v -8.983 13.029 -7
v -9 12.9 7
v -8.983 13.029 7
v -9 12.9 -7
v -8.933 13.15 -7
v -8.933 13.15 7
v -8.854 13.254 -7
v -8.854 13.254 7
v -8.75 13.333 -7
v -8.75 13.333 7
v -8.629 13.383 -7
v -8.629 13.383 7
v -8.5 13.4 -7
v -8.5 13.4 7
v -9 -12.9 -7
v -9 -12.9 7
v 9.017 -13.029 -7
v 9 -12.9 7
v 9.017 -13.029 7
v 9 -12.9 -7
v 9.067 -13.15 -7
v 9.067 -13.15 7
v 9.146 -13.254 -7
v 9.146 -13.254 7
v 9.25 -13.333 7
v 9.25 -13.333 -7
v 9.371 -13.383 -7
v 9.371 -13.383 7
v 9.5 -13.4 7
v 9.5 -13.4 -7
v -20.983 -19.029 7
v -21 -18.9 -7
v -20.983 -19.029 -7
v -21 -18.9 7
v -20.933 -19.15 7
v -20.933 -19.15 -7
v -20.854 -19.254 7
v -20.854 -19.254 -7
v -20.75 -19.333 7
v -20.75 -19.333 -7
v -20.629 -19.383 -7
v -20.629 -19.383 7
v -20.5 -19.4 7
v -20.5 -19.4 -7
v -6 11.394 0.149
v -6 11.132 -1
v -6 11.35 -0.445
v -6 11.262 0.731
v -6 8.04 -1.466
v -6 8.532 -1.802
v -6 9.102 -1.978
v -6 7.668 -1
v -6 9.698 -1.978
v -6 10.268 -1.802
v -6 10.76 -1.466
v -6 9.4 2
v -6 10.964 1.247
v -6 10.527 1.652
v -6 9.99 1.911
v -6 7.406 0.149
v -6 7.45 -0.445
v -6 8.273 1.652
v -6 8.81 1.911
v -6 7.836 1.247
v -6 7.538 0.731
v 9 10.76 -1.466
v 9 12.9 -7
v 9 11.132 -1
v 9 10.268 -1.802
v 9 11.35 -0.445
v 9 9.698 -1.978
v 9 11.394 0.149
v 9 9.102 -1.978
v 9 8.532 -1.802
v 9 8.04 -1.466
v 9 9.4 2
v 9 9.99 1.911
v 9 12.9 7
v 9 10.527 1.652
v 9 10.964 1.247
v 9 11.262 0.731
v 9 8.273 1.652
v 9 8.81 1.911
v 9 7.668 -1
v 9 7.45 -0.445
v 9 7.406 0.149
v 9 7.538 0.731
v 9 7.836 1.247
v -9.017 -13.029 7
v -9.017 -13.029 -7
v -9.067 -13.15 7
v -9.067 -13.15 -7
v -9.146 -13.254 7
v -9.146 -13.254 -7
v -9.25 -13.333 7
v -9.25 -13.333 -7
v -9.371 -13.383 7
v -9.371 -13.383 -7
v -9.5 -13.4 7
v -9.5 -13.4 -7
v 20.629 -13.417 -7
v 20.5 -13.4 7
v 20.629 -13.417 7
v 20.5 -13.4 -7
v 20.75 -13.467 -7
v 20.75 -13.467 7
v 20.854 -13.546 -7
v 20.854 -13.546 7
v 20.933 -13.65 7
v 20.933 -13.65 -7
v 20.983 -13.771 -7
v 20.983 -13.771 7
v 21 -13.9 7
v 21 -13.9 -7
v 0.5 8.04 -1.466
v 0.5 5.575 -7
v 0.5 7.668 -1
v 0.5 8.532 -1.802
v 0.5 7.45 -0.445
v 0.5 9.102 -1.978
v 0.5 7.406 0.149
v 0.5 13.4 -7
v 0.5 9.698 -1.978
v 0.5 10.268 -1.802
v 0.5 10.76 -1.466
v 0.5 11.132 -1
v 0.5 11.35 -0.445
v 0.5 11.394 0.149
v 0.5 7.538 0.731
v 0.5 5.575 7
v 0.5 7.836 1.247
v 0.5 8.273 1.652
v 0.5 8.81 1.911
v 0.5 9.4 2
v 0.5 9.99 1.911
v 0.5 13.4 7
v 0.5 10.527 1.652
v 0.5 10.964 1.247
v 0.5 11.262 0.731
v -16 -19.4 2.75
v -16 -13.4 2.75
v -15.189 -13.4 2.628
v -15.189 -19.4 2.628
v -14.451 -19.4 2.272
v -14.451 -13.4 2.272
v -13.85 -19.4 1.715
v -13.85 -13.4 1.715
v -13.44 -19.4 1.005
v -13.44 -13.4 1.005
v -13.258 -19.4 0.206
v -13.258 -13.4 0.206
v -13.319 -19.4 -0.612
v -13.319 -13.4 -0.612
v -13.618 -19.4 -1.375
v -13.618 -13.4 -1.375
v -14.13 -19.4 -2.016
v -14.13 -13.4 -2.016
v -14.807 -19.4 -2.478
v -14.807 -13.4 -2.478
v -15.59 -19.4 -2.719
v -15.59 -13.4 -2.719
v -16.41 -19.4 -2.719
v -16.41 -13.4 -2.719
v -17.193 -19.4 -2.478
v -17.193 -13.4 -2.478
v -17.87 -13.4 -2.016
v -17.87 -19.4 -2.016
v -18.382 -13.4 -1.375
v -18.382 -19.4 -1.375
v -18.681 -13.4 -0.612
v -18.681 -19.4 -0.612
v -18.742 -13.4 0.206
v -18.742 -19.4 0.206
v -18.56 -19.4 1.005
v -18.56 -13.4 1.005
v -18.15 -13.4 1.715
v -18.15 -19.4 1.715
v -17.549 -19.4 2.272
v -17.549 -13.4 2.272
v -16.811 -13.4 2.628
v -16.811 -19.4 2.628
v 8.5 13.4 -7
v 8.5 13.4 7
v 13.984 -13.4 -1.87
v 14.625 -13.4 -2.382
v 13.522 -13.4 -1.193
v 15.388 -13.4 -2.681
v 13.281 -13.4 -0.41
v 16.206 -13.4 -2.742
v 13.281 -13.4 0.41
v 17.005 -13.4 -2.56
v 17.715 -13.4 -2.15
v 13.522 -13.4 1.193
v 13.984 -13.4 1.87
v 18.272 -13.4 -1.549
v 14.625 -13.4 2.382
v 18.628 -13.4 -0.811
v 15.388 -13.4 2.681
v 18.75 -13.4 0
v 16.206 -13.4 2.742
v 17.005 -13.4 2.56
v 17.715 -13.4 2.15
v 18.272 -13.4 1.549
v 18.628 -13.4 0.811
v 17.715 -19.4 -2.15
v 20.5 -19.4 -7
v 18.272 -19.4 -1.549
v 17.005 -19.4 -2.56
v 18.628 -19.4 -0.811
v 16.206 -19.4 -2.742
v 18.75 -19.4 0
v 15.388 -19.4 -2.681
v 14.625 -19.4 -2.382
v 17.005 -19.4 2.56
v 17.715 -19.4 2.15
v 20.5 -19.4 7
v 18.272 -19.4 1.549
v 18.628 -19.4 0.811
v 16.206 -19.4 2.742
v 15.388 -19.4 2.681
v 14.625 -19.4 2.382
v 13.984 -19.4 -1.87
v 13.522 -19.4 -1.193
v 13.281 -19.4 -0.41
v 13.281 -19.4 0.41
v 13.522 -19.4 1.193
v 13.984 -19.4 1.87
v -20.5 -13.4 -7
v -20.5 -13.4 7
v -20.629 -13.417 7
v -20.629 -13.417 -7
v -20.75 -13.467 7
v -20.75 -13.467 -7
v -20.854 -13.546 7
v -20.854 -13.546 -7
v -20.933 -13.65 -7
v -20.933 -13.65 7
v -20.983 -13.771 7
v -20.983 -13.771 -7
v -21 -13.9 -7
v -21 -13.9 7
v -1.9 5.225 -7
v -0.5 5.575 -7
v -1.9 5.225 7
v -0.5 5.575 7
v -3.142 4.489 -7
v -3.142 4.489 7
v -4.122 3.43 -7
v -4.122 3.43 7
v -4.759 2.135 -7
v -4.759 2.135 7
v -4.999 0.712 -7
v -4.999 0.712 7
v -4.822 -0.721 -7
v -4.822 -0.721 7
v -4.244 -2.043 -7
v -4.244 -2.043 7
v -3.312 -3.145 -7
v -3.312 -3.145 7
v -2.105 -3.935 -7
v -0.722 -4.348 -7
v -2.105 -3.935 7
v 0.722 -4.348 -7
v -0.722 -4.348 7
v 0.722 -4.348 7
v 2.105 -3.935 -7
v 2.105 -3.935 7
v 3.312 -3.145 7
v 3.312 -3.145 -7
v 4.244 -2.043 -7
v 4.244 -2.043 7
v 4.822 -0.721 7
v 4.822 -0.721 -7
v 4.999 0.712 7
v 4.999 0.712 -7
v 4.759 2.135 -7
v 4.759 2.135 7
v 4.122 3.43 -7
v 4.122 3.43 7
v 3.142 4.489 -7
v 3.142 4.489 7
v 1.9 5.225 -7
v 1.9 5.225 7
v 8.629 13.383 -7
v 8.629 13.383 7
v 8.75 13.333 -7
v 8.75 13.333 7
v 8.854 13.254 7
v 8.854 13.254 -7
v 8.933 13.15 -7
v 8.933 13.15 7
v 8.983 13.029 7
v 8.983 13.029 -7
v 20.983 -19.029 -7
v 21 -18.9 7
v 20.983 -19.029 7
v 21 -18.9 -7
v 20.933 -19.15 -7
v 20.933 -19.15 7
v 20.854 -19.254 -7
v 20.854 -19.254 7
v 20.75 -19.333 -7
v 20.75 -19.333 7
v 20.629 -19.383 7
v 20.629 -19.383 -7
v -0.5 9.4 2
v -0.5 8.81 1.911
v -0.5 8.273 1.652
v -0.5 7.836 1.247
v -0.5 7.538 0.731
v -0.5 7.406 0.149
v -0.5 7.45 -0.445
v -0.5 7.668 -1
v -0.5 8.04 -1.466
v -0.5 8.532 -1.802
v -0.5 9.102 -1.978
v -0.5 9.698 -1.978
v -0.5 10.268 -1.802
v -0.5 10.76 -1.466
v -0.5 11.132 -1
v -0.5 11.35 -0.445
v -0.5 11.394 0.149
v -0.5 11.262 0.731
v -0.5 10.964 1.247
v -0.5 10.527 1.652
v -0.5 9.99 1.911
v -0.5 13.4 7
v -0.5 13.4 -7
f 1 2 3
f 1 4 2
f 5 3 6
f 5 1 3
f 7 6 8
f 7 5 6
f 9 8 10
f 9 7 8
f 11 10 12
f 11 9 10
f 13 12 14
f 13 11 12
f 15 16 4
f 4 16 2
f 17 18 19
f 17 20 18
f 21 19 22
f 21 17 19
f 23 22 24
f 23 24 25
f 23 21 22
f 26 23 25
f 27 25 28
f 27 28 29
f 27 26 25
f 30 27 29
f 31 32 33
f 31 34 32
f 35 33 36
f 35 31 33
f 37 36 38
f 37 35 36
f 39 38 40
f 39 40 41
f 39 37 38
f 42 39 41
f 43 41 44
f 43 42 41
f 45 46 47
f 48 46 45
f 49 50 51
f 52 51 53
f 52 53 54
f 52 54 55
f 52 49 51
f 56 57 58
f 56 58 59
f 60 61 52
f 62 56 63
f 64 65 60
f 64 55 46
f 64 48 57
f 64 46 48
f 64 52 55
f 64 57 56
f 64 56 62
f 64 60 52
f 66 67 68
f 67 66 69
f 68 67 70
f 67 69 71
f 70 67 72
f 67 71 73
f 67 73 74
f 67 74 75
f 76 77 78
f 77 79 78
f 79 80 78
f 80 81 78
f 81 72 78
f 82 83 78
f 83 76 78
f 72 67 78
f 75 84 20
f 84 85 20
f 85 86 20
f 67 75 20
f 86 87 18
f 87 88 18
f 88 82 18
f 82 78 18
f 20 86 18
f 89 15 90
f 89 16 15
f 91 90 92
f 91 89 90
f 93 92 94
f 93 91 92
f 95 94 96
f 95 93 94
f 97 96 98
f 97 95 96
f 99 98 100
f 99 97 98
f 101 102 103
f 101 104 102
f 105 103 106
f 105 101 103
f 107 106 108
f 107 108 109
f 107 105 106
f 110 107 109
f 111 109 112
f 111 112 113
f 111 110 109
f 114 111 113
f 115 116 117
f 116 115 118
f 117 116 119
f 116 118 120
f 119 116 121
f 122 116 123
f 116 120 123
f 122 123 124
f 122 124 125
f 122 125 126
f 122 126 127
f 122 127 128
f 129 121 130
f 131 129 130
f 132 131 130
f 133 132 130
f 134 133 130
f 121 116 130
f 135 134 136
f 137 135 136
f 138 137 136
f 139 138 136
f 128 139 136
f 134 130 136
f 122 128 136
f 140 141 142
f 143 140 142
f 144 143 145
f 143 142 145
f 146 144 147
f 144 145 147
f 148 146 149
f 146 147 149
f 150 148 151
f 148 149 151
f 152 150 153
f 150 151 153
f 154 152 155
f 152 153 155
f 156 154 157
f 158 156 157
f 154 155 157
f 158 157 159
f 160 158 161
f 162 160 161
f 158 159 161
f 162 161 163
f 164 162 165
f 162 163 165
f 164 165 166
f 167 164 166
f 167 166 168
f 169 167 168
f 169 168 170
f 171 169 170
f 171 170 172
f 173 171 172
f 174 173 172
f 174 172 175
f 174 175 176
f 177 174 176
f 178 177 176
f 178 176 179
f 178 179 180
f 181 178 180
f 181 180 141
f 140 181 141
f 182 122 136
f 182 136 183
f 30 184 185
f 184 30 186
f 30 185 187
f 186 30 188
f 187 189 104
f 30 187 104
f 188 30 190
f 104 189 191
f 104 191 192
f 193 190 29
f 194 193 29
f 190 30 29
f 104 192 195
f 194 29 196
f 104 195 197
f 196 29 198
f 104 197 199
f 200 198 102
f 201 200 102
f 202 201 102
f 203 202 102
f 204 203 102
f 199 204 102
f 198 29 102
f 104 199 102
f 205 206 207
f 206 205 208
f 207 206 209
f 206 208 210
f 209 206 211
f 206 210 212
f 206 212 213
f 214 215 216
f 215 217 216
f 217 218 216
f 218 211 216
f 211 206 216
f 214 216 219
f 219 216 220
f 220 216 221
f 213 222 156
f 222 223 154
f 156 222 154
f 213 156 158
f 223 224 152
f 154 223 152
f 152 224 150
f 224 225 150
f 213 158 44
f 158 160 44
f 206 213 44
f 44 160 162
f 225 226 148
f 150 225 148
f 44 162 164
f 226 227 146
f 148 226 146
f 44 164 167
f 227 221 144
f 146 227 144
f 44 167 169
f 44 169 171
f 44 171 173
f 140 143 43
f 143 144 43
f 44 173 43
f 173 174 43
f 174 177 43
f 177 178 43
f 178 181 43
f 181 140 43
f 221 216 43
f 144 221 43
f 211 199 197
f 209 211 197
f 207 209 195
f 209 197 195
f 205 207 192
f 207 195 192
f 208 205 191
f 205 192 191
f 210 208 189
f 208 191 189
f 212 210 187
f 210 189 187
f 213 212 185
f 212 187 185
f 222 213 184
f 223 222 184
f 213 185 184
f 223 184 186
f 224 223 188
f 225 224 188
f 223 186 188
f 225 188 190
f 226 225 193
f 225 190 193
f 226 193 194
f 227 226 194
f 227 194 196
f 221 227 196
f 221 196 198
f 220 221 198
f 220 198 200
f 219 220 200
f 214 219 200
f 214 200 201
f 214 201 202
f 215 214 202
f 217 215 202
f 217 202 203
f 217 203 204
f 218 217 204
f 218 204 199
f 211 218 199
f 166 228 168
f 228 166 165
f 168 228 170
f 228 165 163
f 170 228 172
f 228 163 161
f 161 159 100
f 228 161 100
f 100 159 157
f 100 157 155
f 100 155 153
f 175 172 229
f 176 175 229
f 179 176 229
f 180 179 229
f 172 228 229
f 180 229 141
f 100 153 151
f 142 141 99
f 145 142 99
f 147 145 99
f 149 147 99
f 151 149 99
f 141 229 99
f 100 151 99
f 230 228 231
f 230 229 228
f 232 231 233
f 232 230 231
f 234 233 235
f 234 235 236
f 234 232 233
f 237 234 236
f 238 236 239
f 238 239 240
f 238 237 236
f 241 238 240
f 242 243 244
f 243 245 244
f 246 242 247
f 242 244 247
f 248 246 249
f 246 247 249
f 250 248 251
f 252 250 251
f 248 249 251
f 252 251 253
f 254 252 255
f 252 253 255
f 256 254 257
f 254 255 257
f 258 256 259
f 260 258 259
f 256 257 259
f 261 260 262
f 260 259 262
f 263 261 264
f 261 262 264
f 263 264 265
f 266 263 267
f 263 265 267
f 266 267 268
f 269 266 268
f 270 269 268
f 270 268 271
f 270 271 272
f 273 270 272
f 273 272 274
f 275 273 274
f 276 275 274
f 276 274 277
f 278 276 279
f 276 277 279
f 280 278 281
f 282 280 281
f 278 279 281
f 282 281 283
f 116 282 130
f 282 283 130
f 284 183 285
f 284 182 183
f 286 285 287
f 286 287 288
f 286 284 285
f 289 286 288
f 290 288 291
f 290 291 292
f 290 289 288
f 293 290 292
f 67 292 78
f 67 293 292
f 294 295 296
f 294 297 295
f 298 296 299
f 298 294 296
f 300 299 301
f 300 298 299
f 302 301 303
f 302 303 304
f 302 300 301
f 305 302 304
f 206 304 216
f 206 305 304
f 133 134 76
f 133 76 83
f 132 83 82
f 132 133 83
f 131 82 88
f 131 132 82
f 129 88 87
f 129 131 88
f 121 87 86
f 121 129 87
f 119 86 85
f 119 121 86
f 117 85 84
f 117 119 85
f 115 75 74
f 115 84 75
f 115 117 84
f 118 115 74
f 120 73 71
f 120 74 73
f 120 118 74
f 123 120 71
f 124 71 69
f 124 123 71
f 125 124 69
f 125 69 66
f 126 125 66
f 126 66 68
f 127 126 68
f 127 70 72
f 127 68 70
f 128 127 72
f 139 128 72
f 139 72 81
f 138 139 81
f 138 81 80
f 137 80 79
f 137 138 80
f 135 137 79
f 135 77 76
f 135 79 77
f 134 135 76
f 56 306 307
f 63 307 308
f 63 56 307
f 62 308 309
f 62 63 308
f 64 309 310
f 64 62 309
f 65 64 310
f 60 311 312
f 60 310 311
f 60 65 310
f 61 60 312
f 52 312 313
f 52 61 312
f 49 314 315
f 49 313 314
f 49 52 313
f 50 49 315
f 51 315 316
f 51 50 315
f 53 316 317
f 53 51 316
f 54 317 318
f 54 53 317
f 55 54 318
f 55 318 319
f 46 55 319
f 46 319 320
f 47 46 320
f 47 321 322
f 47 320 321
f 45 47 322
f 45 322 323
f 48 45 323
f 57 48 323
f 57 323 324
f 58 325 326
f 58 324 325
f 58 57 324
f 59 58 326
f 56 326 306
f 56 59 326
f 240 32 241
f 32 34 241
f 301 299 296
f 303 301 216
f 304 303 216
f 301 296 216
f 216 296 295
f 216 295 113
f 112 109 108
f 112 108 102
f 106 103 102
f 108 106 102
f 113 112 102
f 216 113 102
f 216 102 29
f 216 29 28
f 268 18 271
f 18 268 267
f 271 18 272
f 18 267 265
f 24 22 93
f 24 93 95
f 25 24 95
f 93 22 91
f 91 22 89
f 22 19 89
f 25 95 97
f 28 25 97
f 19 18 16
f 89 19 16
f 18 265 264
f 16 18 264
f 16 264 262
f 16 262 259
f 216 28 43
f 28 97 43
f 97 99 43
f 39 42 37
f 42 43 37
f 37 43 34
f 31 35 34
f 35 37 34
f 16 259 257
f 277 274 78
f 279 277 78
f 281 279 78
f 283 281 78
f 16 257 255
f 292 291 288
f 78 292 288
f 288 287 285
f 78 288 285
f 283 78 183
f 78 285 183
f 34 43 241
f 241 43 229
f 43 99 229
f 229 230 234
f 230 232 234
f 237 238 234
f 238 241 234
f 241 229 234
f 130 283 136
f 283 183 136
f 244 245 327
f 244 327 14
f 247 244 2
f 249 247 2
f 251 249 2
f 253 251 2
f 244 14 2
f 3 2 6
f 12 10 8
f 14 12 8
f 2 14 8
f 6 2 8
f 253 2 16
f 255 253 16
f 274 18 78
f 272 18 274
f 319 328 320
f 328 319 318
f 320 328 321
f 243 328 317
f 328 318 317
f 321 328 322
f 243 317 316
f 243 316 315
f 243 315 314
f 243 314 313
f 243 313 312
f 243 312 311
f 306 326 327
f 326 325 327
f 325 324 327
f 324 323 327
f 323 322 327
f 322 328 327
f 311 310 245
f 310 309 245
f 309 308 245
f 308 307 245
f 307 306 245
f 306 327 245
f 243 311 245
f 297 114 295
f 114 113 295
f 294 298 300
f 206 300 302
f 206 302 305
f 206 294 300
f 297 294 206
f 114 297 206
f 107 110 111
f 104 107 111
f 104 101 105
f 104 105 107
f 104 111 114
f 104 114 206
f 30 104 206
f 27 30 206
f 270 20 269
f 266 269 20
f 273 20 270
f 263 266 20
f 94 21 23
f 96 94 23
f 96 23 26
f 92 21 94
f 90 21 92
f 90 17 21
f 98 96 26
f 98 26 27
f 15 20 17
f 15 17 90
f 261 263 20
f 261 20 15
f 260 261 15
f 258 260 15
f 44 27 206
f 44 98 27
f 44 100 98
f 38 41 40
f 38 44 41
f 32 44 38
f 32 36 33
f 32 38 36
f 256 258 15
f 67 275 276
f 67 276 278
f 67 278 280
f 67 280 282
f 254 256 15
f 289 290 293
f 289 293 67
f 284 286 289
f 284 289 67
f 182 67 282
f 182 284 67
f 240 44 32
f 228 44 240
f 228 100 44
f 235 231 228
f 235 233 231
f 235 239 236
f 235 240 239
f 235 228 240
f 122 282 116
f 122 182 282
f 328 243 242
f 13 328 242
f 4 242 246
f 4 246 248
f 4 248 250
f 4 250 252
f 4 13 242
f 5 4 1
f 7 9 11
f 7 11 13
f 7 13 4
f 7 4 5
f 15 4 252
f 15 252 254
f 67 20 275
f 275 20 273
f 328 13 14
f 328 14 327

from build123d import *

# Parameters (mm, degrees)
BOSS_EXTRUDE1_DEPTH     = 7
SKETCH2_R               = 2.75
CUT_EXTRUDE1_DEPTH      = 30.433993953
CUT_EXTRUDE2_DEPTH      = 30.433993953
CUT_EXTRUDE2_DEPTH_BACK = 6
SKETCH3_R               = 2
FILLET1_R               = 0.5


with BuildPart() as part:
    # Sketch1 → Boss-Extrude1 (new, symmetric)
    with BuildSketch(Plane.XY):
        with BuildLine():
            Line((-9, -13.4), (-9, 13.4))
            Line((-9, 13.4), (-0.5, 13.4))
            Line((-0.5, 13.4), (-0.5, 5.574937186))
            ThreePointArc((-0.5, 5.574937186), (0, -4.4), (0.5, 5.574937186))
            Line((0.5, 5.574937186), (0.5, 13.4))
            Line((0.5, 13.4), (9, 13.4))
            Line((9, 13.4), (9, -13.4))
            Line((9, -13.4), (21, -13.4))
            Line((21, -13.4), (21, -19.4))
            Line((21, -19.4), (-21, -19.4))
            Line((-21, -19.4), (-21, -13.4))
            Line((-21, -13.4), (-9, -13.4))
        make_face()
    extrude(amount=BOSS_EXTRUDE1_DEPTH, both=True)

    # Sketch2 → Cut-Extrude1 (cut, through all)
    with BuildSketch(Plane(origin=(0, 0, 0), x_dir=(1, 0, 0), z_dir=(0, 1, 0))):
        with Locations(Location((-16, 0, 0), (0, 0, 270))):
            Circle(SKETCH2_R)
        with Locations((16, 0)):
            Circle(SKETCH2_R)
    extrude(amount=-CUT_EXTRUDE1_DEPTH, mode=Mode.SUBTRACT)

    # Sketch3 → Cut-Extrude2 (cut, two sides: drawn at the far end of the back side and taken through both)
    with BuildSketch(Plane(origin=(0, 0, 0), x_dir=(0, 0, -1), z_dir=(1, 0, 0)).offset(-CUT_EXTRUDE2_DEPTH_BACK)):
        with Locations(Location((0, 9.4, 0), (0, 0, 180))):
            Circle(SKETCH3_R)
    extrude(amount=CUT_EXTRUDE2_DEPTH + CUT_EXTRUDE2_DEPTH_BACK, mode=Mode.SUBTRACT)

    # Fillet1
    fillet1_edges = [part.edges().sort_by_distance(p)[0] for p in [
        (9, 13.4, 0),
        (9, -13.4, 0),
        (21, -13.4, 0),
        (21, -19.4, 0),
        (-21, -19.4, 0),
        (-21, -13.4, 0),
        (-9, -13.4, 0),
        (-9, 13.4, 0),
    ]]
    fillet(fillet1_edges, radius=FILLET1_R)


solid = part.part
